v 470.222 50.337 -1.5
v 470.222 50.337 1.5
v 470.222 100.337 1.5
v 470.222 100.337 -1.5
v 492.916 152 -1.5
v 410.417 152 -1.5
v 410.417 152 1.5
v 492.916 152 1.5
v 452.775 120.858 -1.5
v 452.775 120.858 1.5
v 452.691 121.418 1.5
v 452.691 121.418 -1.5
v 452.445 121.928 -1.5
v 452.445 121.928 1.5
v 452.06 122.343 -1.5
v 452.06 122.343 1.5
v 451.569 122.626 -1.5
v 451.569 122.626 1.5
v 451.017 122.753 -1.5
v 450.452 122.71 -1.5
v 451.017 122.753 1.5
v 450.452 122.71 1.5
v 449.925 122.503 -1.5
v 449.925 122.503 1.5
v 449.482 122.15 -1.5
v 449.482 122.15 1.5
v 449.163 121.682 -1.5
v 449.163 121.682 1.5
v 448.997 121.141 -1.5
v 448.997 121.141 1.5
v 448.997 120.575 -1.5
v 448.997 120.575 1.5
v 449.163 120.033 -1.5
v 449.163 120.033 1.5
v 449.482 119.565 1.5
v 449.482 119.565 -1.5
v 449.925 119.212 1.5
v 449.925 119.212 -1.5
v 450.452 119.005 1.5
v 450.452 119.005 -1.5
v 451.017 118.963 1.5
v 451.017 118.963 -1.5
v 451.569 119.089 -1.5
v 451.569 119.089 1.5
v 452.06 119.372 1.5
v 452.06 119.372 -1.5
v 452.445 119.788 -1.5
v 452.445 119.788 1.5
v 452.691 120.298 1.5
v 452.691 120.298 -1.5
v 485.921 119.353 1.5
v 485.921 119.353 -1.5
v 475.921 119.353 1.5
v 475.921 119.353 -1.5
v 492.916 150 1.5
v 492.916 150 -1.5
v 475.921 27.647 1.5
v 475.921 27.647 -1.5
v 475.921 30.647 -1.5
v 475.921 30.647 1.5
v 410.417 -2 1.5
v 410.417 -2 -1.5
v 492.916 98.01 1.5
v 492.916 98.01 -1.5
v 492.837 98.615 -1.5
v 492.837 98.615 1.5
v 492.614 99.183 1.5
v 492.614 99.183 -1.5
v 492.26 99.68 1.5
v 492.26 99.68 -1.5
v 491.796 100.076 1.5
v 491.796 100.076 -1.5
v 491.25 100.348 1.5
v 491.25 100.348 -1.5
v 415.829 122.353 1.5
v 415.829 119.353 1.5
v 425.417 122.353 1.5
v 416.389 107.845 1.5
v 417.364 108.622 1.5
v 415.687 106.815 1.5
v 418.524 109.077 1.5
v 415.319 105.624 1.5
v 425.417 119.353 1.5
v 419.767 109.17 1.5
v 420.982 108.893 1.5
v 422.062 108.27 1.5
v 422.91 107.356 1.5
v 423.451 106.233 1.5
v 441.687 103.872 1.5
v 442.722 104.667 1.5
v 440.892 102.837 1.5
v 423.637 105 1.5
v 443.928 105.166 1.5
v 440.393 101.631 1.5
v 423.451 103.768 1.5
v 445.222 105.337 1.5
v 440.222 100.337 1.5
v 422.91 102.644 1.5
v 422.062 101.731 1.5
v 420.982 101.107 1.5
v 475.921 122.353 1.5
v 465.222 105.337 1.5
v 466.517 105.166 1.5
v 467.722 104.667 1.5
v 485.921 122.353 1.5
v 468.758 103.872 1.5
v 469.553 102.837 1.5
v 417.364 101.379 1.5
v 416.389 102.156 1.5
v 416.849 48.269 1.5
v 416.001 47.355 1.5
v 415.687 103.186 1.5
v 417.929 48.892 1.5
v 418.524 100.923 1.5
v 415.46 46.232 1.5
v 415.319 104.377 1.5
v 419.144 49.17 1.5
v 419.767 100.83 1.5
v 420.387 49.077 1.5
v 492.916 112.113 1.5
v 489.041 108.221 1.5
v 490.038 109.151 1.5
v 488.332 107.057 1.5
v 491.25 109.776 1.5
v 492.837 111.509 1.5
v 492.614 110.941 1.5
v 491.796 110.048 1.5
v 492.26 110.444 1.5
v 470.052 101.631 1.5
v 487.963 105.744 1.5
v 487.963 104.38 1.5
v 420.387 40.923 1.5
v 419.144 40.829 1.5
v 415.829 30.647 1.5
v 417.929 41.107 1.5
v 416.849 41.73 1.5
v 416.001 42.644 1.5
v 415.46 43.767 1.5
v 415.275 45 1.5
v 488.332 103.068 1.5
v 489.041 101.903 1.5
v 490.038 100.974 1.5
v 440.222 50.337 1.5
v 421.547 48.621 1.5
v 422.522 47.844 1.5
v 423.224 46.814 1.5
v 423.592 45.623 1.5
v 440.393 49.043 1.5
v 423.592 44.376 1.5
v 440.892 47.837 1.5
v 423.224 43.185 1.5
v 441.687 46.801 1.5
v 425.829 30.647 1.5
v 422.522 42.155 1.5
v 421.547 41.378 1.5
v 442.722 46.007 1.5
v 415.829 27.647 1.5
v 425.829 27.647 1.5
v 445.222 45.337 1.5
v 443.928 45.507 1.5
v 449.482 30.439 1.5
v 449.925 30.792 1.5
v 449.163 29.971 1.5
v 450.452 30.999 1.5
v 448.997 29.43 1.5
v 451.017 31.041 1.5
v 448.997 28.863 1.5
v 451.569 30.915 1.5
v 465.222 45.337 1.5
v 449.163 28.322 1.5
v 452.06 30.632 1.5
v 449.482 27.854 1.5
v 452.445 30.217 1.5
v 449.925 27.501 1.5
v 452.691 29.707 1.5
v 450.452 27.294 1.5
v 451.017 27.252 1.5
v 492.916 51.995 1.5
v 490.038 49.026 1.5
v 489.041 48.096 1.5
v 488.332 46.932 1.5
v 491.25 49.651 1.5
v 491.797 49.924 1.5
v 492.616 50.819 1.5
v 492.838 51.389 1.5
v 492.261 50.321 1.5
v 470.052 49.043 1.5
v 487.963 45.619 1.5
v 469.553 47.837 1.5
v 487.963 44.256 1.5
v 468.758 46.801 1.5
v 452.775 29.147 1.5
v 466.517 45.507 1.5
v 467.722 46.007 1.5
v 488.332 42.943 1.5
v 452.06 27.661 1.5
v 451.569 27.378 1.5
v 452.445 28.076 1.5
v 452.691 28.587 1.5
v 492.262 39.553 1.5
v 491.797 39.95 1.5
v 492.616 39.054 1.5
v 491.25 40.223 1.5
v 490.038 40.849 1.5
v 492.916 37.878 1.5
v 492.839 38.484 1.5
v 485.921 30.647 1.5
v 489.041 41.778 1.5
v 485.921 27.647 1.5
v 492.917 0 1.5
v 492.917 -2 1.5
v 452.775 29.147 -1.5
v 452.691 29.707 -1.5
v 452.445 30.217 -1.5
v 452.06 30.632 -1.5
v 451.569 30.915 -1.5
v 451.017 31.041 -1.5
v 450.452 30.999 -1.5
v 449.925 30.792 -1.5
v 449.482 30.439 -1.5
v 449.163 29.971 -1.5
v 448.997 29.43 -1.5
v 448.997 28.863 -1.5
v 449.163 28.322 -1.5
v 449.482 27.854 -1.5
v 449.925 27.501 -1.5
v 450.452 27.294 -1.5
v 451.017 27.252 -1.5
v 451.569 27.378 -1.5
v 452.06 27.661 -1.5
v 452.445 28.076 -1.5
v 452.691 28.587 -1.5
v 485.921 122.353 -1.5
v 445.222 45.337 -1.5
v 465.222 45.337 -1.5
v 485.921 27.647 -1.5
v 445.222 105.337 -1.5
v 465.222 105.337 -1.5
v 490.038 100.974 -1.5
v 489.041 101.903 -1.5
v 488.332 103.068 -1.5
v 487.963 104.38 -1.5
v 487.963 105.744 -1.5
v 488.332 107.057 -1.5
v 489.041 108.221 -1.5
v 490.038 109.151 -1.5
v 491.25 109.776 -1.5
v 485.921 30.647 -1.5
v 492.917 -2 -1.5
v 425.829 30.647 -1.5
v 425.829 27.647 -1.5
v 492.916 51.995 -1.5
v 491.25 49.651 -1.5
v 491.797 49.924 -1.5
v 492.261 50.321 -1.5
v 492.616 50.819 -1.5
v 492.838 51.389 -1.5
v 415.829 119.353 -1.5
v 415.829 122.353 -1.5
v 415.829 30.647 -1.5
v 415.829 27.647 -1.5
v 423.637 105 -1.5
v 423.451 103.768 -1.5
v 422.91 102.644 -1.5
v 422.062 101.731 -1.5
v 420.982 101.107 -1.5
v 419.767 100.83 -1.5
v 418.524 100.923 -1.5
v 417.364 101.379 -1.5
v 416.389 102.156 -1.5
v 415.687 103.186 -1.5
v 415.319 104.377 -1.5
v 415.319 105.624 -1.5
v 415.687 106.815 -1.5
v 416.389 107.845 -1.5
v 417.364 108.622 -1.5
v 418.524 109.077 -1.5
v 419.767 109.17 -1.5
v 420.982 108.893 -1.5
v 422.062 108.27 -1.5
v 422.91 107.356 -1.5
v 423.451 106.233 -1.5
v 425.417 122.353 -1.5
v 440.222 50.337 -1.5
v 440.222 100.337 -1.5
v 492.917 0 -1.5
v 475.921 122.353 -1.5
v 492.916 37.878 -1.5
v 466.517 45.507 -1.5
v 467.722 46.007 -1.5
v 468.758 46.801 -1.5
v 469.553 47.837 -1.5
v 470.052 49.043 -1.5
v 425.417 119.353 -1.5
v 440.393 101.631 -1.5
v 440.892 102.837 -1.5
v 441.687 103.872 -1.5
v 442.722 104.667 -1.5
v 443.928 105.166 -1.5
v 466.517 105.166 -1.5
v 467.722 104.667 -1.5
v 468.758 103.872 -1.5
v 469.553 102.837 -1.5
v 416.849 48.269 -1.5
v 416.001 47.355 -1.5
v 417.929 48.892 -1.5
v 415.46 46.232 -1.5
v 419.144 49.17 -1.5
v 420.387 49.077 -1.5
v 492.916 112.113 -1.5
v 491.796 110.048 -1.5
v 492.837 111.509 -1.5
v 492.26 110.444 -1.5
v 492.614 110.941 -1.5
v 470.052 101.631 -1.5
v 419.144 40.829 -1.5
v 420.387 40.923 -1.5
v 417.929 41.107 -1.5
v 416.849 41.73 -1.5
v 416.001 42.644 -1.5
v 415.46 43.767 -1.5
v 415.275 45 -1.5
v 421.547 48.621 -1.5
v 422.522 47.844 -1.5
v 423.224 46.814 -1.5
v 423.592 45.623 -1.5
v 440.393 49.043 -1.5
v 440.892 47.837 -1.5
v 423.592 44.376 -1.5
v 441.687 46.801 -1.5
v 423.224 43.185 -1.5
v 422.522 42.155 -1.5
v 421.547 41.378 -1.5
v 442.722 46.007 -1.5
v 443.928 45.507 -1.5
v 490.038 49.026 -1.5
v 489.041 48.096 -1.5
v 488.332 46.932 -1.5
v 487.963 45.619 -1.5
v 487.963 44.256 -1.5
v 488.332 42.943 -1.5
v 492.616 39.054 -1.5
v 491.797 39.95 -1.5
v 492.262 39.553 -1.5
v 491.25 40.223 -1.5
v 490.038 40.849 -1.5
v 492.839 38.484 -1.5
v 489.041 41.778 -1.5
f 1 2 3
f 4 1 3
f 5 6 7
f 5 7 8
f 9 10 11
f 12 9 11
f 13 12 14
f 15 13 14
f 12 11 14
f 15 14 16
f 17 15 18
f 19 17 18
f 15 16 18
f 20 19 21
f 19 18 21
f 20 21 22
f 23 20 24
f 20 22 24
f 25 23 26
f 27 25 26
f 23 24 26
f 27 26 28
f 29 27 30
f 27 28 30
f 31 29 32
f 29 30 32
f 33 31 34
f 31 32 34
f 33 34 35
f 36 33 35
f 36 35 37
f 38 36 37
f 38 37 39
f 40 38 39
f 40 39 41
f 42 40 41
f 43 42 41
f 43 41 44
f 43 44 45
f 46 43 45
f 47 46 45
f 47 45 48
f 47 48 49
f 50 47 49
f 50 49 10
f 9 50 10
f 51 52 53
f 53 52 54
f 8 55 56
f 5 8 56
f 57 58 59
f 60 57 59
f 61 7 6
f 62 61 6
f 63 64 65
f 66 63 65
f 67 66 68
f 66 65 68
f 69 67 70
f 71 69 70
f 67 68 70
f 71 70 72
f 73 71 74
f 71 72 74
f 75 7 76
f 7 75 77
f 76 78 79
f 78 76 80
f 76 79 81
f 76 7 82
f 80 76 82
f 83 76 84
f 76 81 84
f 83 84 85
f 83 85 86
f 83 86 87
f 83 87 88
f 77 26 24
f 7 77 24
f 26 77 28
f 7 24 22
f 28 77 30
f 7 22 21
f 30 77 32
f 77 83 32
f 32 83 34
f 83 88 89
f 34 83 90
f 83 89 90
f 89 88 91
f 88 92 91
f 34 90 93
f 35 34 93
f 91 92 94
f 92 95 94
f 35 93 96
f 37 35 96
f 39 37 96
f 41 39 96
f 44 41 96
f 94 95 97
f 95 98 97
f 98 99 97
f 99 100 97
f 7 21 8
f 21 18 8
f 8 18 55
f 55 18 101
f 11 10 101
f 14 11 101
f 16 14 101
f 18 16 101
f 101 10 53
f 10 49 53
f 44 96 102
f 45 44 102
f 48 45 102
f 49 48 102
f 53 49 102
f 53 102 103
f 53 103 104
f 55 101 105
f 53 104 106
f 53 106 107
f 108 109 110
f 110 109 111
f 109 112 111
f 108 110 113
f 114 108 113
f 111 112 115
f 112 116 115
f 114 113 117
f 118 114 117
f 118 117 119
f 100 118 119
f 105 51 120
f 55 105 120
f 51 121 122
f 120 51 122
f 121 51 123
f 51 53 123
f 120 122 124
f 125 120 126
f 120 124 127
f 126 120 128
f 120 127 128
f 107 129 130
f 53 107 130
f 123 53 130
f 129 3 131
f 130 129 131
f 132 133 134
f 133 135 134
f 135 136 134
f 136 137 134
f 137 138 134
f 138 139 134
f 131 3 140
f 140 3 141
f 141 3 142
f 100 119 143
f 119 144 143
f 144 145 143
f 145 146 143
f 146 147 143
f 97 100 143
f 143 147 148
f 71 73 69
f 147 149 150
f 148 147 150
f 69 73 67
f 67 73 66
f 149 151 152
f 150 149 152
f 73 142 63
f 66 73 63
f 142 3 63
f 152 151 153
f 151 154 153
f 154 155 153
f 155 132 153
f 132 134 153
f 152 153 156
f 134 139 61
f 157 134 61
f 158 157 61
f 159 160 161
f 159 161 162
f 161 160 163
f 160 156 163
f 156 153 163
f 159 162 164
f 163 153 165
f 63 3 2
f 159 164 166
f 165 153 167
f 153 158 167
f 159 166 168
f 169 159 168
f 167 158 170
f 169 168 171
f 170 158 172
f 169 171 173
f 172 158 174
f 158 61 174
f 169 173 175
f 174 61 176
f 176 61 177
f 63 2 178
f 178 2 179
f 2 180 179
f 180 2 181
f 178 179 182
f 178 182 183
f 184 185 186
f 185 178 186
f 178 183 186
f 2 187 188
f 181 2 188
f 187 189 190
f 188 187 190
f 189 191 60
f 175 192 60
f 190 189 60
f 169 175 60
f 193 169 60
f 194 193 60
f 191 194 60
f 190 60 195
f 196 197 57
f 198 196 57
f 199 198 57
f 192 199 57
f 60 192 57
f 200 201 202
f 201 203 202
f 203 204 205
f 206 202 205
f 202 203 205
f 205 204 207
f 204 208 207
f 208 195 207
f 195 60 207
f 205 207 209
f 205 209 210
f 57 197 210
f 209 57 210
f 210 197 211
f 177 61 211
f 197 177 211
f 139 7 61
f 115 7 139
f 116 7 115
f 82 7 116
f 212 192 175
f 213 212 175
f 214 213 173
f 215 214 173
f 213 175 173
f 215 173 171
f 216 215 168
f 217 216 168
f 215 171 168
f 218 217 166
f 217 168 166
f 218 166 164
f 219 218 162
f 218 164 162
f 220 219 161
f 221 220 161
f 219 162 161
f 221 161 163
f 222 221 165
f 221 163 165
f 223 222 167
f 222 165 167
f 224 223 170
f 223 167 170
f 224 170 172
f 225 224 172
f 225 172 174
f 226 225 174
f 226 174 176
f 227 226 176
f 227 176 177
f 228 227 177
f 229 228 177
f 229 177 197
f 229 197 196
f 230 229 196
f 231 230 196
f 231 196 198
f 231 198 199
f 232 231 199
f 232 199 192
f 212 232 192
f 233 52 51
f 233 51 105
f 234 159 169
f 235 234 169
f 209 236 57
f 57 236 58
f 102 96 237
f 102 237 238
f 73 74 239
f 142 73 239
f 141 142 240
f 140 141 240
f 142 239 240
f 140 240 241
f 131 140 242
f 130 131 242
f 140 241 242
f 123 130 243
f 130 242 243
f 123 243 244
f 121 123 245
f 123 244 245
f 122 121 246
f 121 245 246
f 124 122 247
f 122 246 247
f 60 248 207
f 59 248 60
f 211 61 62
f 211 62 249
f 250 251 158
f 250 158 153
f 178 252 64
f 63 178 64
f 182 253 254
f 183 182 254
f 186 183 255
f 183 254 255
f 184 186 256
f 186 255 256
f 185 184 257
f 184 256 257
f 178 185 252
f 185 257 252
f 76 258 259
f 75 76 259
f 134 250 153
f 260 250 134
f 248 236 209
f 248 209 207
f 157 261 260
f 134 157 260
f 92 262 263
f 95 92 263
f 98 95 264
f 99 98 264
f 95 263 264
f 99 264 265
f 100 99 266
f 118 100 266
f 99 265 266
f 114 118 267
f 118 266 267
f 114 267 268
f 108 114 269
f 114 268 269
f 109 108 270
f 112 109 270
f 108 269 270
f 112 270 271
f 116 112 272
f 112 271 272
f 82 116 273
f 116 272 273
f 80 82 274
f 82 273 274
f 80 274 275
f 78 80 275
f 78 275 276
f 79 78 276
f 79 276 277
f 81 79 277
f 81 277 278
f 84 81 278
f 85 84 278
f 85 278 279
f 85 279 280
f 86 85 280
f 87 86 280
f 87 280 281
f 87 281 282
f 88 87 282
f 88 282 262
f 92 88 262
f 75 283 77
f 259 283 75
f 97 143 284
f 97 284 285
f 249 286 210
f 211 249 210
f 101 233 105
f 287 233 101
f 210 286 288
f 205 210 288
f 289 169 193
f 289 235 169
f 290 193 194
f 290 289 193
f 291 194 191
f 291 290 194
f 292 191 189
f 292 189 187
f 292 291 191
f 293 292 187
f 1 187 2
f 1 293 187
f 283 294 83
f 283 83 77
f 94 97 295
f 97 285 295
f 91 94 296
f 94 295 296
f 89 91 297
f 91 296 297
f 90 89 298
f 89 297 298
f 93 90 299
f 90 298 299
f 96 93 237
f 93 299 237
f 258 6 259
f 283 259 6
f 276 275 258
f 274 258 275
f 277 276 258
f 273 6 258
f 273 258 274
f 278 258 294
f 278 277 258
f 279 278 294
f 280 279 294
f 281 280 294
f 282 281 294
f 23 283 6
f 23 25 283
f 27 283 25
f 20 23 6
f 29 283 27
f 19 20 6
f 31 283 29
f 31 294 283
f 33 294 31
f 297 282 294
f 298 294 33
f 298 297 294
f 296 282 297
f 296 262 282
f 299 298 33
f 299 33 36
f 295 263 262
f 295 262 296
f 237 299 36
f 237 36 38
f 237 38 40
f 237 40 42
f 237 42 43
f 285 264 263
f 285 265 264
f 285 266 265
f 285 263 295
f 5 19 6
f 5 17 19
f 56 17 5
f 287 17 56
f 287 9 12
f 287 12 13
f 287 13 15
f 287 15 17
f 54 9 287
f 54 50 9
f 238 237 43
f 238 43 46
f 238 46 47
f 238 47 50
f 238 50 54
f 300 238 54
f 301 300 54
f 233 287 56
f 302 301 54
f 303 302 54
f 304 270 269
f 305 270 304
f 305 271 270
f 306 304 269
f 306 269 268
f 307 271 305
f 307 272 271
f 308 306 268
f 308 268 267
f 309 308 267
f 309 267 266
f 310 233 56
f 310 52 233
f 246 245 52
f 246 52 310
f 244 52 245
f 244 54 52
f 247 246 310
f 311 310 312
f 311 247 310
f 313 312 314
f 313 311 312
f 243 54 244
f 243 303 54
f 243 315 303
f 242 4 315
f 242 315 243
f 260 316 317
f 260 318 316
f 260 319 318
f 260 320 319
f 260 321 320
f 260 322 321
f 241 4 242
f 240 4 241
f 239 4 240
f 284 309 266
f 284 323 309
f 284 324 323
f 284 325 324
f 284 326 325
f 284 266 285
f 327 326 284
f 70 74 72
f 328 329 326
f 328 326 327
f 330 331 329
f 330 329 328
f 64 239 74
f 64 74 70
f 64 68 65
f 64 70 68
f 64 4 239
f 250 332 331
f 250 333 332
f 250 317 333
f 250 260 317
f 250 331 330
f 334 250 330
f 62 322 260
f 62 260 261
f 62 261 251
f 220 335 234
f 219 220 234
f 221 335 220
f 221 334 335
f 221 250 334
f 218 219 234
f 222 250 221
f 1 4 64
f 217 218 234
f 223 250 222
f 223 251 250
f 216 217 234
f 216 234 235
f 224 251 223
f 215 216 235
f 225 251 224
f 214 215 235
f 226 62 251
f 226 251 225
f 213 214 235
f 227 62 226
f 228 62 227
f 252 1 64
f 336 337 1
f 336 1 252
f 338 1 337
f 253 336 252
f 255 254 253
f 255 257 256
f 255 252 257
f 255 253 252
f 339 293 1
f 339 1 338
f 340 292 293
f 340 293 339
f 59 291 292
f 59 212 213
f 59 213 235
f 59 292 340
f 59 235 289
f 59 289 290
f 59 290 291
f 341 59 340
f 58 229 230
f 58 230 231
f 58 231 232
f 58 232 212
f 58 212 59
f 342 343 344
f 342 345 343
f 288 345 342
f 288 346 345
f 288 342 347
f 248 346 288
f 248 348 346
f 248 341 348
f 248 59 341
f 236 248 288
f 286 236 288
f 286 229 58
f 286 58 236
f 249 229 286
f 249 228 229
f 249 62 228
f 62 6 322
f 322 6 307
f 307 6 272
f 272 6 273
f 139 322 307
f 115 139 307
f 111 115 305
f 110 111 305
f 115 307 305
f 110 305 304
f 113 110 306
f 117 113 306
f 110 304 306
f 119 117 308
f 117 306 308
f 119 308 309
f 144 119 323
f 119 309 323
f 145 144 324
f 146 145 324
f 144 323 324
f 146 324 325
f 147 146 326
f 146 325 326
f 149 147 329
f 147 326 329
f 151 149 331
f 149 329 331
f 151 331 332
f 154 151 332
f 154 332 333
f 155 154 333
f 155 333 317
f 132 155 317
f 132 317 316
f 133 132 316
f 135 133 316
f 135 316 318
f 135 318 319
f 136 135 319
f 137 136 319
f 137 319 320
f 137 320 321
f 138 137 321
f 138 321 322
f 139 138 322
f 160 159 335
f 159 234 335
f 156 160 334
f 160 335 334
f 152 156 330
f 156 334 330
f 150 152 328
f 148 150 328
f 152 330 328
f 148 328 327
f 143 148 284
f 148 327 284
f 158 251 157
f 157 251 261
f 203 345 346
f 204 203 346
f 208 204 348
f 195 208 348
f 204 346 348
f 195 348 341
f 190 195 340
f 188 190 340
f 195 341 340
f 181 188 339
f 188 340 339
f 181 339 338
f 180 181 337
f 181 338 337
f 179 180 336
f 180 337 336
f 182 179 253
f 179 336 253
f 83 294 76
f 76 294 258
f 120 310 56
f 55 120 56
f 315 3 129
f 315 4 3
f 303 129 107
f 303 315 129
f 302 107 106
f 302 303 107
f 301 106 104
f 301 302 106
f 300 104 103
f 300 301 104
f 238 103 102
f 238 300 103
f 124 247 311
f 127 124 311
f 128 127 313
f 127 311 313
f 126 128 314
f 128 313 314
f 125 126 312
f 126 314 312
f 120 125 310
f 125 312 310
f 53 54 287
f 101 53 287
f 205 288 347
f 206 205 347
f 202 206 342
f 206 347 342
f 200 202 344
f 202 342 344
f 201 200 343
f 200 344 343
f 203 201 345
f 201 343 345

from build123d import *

# Parameters (mm, degrees)
SALIENTE_EXTRUIR1_START = -1.5
SALIENTE_EXTRUIR1_DEPTH = 3
CROQUIS4_W              = 30
CROQUIS4_H              = 60
CORTAR_EXTRUIR3_DEPTH   = 10
CROQUIS5_W              = 9.999999994
CROQUIS5_H              = 3
CROQUIS5_W_2            = 9.587122789
CORTAR_EXTRUIR4_DEPTH   = 10
CROQUIS6_R              = 1.9
CORTAR_EXTRUIR5_DEPTH   = 10
REDONDEO1_R             = 5
CROQUIS7_W              = 82.5
CROQUIS7_H              = 3
SALIENTE_EXTRUIR2_DEPTH = 2
CROQUIS8_W              = 82.49989544
CROQUIS8_H              = 3
SALIENTE_EXTRUIR3_DEPTH = 2
CROQUIS9_R              = 4.181897372
CORTAR_EXTRUIR6_DEPTH   = 10


# Read off the part's stored shape, not the designer's step: Saliente-Extruir1
with BuildPart() as part:
    # Saliente-Extruir1 outline → Saliente-Extruir1 (new body)
    with BuildSketch(Plane.XY.offset(SALIENTE_EXTRUIR1_START)):
        with BuildLine():
            ThreePointArc((492.916449572, 98.009593947), (492.452410006, 99.442022929), (491.249851225, 100.348134338))
            ThreePointArc((491.249851225, 100.348134338), (487.916517891, 105.062179546), (491.249851225, 109.776224754))
            ThreePointArc((491.249851225, 109.776224754), (492.452037009, 110.681812922), (492.916439741, 112.113480025))
            Line((492.916439741, 112.113480025), (492.916413331, 149.999679341))
            Line((492.916413331, 149.999679341), (410.416517891, 149.999679341))
            Line((410.416517891, 149.999679341), (410.416517891, -0.000320659))
            Line((410.416517891, -0.000320659), (492.916517891, -0.000320659))
            Line((492.916517891, -0.000320659), (492.916491488, 37.877716604))
            ThreePointArc((492.916491488, 37.877716604), (492.45443711, 39.314289338), (491.249851225, 40.223249354))
            ThreePointArc((491.249851225, 40.223249354), (487.916517891, 44.937294562), (491.249851225, 49.65133977))
            ThreePointArc((491.249851225, 49.65133977), (492.453865854, 50.559496169), (492.916481647, 51.994900607))
            Line((492.916481647, 51.994900607), (492.916449572, 98.009593947))
        make_face()
    extrude(amount=SALIENTE_EXTRUIR1_DEPTH)

    # Croquis4 → Cortar-Extruir3 (cut)
    with BuildSketch(Plane.XY.offset(1.5)):
        with Locations((455.222459901, 75.336681949)):
            Rectangle(CROQUIS4_W, CROQUIS4_H)
    extrude(amount=-CORTAR_EXTRUIR3_DEPTH, mode=Mode.SUBTRACT)

    # Croquis5 → Cortar-Extruir4 (cut)
    with BuildSketch(Plane(origin=(0, 0, -1.5), x_dir=(-1, 0, 0), z_dir=(0, 0, -1))):
        with Locations((-420.82939509, 29.146675475)):
            Rectangle(CROQUIS5_W, CROQUIS5_H)
        with Locations((-480.921167725, 29.146675475)):
            Rectangle(CROQUIS5_W, CROQUIS5_H)
        with Locations((-480.921167725, 120.852683208)):
            Rectangle(CROQUIS5_W, CROQUIS5_H)
        with Locations((-420.622956488, 120.852683208)):
            Rectangle(CROQUIS5_W_2, CROQUIS5_H)
    extrude(amount=-CORTAR_EXTRUIR4_DEPTH, mode=Mode.SUBTRACT)

    # Croquis6 → Cortar-Extruir5 (cut)
    with BuildSketch(Plane.XY.offset(1.5)):
        with Locations((450.875281407, 29.146675475)):
            Circle(CROQUIS6_R)
        with Locations((450.875281407, 120.857819079)):
            Circle(CROQUIS6_R)
    extrude(amount=-CORTAR_EXTRUIR5_DEPTH, mode=Mode.SUBTRACT)

    # Redondeo1
    redondeo1_edges = [part.edges().sort_by_distance(p)[0] for p in [
        (470.222459901, 105.336681949, 0),
        (470.222459901, 45.336681949, 0),
        (440.222459901, 45.336681949, 0),
        (440.222459901, 105.336681949, 0),
    ]]
    fillet(redondeo1_edges, radius=REDONDEO1_R)

    # Croquis7 → Saliente-Extruir2 (add)
    with BuildSketch(Plane.XZ.offset(0.000320659)):
        with Locations((451.666517891, 0)):
            Rectangle(CROQUIS7_W, CROQUIS7_H)
    extrude(amount=SALIENTE_EXTRUIR2_DEPTH)

    # Croquis8 → Saliente-Extruir3 (add)
    with BuildSketch(Plane(origin=(0, 149.999679341, 0), x_dir=(1, 0, 0), z_dir=(0, 1, 0))):
        with Locations((451.666465611, 0)):
            Rectangle(CROQUIS8_W, CROQUIS8_H)
    extrude(amount=SALIENTE_EXTRUIR3_DEPTH)

    # Croquis9 → Cortar-Extruir6 (cut)
    with BuildSketch(Plane(origin=(0, 0, -1.5), x_dir=(-1, 0, 0), z_dir=(0, 0, -1))):
        with Locations((-419.456517891, 44.999679341)):
            Circle(CROQUIS9_R)
        with Locations(Location((-419.454650283, 105.000242051, 0), (0, 0, 180))):
            Circle(CROQUIS9_R)
    extrude(amount=-CORTAR_EXTRUIR6_DEPTH, mode=Mode.SUBTRACT)


solid = part.part
